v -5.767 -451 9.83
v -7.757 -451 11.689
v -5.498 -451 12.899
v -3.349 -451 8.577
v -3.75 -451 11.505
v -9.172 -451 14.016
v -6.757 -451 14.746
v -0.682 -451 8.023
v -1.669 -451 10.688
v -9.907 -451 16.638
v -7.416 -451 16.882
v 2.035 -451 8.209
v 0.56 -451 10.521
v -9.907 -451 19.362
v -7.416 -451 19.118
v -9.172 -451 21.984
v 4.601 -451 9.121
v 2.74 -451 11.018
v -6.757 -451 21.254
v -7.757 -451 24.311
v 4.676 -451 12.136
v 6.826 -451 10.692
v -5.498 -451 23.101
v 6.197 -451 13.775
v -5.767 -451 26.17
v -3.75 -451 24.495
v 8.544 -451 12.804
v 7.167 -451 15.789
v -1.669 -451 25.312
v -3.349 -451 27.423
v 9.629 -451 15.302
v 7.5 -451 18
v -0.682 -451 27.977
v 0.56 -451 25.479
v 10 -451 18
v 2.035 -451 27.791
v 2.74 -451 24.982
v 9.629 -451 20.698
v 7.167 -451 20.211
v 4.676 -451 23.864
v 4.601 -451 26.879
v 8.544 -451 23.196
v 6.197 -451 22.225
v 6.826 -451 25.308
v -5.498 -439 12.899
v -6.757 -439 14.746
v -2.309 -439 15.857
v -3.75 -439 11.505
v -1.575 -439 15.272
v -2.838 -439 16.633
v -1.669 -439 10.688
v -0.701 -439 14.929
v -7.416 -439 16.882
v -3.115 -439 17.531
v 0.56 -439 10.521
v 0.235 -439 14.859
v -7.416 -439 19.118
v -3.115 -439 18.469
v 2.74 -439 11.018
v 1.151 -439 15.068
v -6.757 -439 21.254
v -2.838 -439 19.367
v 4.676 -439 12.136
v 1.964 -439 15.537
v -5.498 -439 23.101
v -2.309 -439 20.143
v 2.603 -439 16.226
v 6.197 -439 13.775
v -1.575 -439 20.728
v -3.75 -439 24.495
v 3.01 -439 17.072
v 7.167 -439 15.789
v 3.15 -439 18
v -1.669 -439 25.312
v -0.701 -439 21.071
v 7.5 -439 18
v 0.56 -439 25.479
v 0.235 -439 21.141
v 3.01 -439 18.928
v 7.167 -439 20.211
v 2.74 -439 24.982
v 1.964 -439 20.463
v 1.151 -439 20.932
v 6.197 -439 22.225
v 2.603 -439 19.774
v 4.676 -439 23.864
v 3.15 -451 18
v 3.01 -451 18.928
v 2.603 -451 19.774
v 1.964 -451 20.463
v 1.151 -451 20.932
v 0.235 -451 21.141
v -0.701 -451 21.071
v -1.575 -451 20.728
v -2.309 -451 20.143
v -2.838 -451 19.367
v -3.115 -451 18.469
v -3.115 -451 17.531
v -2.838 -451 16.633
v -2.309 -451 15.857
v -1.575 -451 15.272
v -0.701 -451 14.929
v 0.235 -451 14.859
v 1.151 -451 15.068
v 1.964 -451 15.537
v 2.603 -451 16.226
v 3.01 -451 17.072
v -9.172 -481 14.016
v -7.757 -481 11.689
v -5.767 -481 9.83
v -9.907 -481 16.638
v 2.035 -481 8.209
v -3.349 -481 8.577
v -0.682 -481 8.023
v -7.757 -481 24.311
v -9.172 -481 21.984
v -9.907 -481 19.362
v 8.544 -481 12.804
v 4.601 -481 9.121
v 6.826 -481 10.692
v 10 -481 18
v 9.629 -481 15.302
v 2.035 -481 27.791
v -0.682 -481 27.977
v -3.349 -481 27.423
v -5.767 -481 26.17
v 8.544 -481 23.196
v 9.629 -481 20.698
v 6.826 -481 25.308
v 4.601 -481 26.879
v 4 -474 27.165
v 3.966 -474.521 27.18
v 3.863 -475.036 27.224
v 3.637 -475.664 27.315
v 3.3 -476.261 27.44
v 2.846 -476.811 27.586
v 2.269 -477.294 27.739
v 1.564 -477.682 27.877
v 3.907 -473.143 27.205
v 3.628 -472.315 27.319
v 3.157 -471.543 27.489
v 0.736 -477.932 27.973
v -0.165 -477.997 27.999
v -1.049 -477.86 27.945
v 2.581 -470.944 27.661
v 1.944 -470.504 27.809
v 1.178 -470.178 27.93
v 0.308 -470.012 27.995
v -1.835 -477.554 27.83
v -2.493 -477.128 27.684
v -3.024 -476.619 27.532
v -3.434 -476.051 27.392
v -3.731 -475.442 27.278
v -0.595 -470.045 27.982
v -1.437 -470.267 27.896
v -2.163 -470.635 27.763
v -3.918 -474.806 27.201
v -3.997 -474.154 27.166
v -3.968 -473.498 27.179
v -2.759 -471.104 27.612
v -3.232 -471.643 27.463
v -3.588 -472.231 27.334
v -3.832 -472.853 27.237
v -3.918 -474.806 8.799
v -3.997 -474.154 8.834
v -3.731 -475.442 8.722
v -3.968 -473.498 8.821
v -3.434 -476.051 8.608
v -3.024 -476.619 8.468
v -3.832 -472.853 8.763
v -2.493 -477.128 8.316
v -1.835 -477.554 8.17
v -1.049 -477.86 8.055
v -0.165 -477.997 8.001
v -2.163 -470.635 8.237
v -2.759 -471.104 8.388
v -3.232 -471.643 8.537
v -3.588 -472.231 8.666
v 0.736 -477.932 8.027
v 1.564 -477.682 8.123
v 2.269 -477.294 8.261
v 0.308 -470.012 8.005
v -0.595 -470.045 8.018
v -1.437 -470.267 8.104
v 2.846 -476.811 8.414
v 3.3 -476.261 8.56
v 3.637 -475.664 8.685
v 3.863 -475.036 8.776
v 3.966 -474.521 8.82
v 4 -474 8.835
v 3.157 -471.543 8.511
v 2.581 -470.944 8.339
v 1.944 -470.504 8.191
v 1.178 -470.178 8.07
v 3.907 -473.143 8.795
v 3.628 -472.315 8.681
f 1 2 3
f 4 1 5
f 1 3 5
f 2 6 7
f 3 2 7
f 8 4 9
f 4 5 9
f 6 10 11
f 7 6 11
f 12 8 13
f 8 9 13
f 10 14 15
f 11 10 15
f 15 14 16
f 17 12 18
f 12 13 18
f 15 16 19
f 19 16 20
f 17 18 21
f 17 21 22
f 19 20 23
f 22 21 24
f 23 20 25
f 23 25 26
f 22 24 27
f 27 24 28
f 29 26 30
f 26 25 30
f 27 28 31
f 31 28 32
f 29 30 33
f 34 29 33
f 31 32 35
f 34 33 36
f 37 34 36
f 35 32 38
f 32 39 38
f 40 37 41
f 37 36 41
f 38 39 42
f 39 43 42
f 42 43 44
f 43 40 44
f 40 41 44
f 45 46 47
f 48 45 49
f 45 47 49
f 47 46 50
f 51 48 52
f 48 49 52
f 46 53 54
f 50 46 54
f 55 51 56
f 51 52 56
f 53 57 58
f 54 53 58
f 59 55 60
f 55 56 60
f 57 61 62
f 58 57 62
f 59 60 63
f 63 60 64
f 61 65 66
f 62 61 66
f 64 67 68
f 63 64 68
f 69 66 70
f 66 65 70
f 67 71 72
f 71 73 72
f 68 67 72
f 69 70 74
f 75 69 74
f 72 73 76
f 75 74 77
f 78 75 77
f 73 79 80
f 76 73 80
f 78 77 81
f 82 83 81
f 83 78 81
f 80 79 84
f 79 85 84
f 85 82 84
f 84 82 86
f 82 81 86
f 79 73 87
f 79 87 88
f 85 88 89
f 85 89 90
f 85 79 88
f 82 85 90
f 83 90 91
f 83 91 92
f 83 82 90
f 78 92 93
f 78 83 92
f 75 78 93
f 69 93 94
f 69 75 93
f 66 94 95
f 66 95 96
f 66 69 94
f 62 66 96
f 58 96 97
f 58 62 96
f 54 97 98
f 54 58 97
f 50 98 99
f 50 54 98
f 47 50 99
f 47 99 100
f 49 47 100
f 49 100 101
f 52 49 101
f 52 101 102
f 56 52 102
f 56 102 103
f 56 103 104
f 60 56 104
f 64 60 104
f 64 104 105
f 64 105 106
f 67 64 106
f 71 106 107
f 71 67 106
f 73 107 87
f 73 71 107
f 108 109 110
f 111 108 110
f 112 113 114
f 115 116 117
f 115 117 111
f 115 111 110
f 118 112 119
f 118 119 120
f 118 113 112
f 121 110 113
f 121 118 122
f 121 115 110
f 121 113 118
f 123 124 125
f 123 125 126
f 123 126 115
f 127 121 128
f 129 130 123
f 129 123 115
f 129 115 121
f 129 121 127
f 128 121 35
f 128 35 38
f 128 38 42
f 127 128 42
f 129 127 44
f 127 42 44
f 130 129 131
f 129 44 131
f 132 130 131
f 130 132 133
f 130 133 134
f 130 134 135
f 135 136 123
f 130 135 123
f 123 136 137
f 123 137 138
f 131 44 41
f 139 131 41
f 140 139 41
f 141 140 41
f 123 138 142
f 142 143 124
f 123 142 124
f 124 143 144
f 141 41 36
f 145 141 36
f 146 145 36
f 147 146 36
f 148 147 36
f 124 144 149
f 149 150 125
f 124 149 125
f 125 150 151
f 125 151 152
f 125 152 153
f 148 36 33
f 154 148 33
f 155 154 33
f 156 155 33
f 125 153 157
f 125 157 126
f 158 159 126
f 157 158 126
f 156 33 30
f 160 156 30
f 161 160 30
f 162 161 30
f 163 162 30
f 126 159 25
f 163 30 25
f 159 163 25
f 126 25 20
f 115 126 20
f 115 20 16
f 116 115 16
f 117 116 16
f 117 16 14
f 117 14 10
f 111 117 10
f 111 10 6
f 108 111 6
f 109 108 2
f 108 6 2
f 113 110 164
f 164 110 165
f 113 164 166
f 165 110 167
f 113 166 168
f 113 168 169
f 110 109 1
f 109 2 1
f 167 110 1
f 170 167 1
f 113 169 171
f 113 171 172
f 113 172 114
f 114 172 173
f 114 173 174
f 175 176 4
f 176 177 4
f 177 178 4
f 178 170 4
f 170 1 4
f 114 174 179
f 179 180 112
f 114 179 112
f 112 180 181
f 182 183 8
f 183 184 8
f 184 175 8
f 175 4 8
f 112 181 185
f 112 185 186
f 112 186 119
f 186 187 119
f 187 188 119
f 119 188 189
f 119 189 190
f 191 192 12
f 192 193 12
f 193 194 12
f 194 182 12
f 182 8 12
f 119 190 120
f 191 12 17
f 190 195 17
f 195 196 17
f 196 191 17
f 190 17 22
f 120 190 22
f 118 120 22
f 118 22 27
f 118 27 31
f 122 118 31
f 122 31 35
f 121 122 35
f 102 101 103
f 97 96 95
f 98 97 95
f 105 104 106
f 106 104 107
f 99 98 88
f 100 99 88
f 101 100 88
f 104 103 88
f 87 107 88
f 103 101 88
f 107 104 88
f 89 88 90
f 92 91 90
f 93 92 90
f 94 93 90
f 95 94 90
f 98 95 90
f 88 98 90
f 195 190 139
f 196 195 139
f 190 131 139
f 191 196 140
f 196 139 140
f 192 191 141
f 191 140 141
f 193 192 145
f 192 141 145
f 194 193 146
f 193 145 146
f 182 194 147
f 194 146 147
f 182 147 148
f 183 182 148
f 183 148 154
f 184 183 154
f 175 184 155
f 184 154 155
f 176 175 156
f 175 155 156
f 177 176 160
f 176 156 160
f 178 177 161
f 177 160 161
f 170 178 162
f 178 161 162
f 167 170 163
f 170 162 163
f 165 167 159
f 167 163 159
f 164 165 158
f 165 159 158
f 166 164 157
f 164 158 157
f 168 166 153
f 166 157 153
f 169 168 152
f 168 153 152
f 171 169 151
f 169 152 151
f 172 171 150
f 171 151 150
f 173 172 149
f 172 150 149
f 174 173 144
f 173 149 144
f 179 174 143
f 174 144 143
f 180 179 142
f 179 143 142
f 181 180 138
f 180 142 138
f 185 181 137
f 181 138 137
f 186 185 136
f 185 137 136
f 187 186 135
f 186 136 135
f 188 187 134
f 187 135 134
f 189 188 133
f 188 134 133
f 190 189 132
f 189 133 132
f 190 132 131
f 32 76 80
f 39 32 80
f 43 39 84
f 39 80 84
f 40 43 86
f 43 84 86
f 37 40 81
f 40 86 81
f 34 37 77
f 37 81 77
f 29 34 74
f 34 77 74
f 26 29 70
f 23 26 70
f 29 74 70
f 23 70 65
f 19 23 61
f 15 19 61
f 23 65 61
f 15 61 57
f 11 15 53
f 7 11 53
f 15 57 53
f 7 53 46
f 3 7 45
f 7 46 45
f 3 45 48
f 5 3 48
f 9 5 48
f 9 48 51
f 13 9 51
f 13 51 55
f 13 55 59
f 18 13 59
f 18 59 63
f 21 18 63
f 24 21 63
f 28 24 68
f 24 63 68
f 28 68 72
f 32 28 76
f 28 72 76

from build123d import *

# Parameters (mm, degrees)
SKETCH004_R       = 7.5
SKETCH004_R_2     = 3.15
PAD004_DEPTH      = 12
SKETCH005_R       = 10
PAD005_DEPTH      = 30
SKETCH006_R       = 4
POCKET_DEPTH      = 10.001
POCKET_DEPTH_BACK = 10.001


with BuildPart() as part:
    # Sketch004 → Pad004 (new body)
    with BuildSketch(Plane.XZ):
        Circle(SKETCH004_R)
        Circle(SKETCH004_R_2, mode=Mode.SUBTRACT)
    extrude(amount=PAD004_DEPTH)

    # Sketch005 → Pad005 (join)
    with BuildSketch(Plane.XZ.offset(12)):
        Circle(SKETCH005_R)
    extrude(amount=PAD005_DEPTH)

    # Sketch006 → Pocket (cut, two sides)
    with BuildSketch(Plane(origin=(0, -35, 0), x_dir=(1, 0, 0), z_dir=(0, 0, 1))) as pocket_sk:
        Circle(SKETCH006_R)
    extrude(amount=-POCKET_DEPTH, mode=Mode.SUBTRACT)
    extrude(pocket_sk.sketch, amount=POCKET_DEPTH_BACK, mode=Mode.SUBTRACT)


with BuildPart() as part_1:
    # Body002 placement: moved
    add(part.part.moved(Location((0, -439, 18))))


solid = part_1.part
